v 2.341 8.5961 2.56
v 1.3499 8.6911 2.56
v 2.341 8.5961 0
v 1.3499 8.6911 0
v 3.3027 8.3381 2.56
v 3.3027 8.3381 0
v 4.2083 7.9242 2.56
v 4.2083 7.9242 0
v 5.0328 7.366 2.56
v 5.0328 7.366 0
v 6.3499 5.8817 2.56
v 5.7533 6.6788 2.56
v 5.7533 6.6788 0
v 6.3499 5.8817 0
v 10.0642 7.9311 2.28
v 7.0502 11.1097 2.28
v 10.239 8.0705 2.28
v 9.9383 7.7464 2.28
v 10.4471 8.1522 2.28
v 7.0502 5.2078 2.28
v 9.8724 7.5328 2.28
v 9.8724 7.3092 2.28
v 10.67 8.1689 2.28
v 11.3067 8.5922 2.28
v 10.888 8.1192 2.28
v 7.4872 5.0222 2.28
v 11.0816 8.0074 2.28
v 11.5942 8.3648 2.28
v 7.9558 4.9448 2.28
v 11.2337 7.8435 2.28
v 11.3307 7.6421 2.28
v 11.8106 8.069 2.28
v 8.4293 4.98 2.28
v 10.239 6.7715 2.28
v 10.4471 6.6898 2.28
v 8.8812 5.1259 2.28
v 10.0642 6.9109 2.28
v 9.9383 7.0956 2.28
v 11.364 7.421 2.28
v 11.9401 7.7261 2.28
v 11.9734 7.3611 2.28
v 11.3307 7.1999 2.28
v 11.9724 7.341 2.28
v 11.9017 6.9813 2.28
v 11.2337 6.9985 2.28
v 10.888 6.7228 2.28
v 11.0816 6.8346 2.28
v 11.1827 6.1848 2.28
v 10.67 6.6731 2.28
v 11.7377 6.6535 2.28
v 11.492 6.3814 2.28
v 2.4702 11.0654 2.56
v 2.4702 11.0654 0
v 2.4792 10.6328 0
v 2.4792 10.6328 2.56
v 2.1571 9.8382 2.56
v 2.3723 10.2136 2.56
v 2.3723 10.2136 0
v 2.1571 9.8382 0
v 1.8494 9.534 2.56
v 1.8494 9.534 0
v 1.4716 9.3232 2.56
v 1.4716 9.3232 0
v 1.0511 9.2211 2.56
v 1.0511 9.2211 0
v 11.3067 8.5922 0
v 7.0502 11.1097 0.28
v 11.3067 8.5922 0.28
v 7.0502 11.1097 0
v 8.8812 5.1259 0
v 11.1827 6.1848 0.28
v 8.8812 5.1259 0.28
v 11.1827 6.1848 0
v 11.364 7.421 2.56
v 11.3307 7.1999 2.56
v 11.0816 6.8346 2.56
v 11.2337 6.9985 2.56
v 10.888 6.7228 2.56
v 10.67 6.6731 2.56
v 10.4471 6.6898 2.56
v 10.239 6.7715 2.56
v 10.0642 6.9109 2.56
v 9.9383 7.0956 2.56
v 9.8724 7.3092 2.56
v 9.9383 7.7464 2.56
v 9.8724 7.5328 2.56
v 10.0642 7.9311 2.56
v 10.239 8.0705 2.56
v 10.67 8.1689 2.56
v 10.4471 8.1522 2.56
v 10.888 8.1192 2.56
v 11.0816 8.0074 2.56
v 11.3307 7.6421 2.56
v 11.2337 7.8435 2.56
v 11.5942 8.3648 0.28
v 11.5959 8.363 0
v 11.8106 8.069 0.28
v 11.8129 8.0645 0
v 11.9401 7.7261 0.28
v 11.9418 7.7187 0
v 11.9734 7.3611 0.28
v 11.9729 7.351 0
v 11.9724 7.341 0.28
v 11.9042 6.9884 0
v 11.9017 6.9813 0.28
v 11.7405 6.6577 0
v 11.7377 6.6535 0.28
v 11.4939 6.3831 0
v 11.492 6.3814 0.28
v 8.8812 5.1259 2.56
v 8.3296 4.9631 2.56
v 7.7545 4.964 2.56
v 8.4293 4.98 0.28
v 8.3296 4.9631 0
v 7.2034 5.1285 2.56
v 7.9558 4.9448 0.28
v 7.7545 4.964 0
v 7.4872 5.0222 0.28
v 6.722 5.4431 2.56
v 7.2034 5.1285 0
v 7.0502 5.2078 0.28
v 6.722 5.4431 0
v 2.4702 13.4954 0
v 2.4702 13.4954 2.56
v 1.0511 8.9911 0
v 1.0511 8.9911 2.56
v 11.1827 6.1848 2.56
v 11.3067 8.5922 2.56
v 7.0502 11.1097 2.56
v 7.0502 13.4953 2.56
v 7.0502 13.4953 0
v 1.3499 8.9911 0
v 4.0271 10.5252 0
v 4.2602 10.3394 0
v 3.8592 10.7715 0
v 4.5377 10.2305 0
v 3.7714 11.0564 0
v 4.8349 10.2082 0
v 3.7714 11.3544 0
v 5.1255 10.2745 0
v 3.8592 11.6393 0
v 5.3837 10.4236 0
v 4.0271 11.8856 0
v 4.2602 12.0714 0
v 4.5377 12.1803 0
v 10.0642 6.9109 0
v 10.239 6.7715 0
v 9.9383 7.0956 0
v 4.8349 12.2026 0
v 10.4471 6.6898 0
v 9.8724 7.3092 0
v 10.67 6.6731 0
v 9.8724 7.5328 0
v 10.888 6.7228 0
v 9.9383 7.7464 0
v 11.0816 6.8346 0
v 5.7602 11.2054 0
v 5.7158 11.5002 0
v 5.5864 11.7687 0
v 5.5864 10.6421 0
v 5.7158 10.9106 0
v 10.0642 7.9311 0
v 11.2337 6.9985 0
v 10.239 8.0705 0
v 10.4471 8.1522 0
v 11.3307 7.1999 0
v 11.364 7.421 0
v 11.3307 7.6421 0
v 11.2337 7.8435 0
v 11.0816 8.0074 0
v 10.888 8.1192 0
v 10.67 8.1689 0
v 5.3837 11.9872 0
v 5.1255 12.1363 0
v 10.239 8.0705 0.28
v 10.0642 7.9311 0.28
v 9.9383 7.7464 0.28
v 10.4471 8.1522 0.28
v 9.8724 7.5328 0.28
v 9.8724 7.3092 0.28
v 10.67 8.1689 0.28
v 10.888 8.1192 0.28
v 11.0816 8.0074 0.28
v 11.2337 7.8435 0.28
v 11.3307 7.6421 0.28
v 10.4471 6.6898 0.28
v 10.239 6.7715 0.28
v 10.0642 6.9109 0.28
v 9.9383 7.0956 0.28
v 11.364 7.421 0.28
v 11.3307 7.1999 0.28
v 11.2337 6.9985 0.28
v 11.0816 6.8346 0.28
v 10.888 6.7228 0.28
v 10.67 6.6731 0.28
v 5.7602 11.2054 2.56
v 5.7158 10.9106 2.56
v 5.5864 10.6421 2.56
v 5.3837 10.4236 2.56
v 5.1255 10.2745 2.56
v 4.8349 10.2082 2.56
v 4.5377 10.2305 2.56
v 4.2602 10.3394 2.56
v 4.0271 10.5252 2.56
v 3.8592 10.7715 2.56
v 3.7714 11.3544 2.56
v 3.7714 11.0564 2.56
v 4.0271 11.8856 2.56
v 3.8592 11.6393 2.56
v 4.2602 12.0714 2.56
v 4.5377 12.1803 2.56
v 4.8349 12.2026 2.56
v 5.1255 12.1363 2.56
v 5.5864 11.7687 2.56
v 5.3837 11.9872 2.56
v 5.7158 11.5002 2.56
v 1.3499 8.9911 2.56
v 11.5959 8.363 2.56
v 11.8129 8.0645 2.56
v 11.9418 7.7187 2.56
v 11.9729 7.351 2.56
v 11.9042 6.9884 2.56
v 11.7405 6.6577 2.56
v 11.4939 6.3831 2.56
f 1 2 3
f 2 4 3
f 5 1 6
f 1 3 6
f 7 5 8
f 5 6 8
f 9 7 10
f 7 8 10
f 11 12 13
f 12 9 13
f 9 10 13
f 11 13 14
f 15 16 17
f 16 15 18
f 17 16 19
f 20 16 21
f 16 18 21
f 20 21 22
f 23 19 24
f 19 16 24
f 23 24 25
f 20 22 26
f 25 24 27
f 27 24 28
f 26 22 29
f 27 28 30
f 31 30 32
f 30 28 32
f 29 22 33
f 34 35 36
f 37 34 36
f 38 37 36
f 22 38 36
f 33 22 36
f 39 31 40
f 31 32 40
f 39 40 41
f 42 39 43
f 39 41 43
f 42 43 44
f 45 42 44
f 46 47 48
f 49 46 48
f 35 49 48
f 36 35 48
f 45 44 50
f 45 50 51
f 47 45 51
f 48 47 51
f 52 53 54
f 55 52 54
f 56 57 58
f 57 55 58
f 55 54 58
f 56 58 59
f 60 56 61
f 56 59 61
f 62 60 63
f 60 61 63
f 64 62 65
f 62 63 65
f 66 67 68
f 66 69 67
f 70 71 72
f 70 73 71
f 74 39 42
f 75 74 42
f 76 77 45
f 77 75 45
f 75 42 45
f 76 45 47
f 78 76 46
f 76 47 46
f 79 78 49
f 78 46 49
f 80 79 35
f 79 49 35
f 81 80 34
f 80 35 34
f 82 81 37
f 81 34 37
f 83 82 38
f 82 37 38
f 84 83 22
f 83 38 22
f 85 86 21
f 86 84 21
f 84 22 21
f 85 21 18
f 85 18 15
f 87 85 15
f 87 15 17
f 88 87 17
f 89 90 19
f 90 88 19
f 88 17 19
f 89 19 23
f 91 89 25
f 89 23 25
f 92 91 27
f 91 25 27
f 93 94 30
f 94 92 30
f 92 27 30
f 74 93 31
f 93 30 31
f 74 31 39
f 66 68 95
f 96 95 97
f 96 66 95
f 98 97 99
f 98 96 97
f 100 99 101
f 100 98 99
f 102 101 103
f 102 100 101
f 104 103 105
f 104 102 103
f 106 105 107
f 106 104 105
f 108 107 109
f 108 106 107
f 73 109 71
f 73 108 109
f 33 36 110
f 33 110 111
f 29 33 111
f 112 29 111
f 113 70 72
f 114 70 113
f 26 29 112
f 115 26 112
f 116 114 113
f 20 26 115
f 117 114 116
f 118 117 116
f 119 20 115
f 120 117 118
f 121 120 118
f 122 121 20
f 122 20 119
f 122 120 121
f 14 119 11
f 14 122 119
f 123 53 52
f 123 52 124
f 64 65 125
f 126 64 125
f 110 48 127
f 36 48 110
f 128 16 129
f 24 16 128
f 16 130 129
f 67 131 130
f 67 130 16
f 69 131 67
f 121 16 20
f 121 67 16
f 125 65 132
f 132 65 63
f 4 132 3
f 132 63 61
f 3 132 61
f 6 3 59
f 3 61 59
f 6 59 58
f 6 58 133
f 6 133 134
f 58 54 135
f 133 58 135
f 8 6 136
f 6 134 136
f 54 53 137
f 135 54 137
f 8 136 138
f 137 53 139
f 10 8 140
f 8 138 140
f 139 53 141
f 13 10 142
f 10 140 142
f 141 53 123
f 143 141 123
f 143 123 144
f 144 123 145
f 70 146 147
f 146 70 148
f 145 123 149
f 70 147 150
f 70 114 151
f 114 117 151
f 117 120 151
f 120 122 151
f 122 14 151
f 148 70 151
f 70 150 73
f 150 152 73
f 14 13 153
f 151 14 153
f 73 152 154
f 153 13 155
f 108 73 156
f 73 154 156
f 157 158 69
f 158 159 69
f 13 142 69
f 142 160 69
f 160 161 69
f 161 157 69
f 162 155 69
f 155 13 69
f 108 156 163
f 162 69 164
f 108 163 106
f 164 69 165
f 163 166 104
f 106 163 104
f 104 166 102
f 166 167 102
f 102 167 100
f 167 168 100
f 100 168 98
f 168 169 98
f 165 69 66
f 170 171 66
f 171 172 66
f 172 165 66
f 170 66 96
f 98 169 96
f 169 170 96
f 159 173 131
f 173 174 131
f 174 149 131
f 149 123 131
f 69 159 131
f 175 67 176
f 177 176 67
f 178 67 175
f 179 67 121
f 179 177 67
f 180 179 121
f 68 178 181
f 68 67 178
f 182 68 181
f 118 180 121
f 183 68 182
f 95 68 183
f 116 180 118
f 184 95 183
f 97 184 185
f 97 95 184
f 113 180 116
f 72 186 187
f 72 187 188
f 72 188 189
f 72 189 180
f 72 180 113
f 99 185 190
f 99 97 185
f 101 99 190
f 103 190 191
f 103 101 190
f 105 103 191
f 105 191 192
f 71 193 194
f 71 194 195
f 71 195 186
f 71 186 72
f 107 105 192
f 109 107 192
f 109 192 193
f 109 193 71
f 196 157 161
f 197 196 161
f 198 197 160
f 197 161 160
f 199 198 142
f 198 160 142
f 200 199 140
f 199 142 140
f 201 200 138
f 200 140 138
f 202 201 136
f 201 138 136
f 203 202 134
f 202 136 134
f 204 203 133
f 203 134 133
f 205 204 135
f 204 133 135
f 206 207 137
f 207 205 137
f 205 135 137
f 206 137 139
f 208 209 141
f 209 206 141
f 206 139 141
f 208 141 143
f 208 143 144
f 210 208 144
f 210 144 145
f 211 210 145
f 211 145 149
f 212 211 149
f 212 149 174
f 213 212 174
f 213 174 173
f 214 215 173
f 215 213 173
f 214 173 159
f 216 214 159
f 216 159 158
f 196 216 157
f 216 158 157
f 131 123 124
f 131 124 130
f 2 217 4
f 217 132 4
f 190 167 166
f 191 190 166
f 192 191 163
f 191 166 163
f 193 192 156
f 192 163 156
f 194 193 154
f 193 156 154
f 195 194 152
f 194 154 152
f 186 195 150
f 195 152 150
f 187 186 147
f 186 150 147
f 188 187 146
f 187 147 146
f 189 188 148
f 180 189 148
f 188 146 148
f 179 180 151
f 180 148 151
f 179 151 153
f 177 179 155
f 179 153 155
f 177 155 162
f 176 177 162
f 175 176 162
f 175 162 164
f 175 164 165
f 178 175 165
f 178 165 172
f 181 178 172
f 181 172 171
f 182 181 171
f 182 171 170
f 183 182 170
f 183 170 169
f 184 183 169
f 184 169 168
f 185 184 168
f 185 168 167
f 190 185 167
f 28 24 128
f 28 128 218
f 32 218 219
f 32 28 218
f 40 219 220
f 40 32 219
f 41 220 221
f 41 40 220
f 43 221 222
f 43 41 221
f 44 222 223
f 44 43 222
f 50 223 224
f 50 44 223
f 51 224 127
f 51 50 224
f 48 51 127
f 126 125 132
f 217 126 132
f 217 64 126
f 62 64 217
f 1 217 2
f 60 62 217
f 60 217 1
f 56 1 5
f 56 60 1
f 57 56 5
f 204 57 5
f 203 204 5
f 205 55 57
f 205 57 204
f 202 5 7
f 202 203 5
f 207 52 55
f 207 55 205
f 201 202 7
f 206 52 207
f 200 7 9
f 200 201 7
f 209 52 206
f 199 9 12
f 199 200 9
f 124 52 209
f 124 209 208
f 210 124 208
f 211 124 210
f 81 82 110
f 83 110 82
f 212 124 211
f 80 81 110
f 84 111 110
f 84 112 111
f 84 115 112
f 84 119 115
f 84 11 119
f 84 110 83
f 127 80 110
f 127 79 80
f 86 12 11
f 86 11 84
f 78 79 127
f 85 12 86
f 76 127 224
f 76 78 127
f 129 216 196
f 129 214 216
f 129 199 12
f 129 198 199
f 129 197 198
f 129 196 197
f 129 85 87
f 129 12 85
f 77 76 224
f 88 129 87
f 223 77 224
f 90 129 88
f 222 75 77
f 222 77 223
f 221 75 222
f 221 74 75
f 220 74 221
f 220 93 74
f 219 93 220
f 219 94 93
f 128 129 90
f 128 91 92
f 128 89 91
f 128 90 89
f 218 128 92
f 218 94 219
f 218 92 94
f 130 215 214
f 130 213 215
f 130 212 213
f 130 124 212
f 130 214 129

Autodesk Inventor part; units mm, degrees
ref_plane "YZ Plane" through (0, 0, 0) normal (1, 0, 0) x (0, 1, 0)
ref_plane "XZ Plane" through (0, 0, 0) normal (0, 1, 0) x (-1, 0, 0)
sketch "Sketch1" plane through (0, 0, 0) normal (0, 0, 1) x (1, 0, 0)
  line L0 (0, 0) -> (13.07, 0) construction
  line L1 (13.07, 0) -> (13.07, 20) construction
  line L2 (13.07, 20) -> (0, 20) construction
  line L3 (0, 20) -> (0, 0) construction
  line L4 (0.0102, 11.1339) -> (2.4902, 11.1339) construction
  line L5 (7.0502, 11.1097) -> (11.3067, 8.5922)
  arc A0 (11.1827, 6.1848) -> (11.3067, 8.5922) centre (10.614, 7.421) ccw
  line L6 (2.4702, 13.4954) -> (7.0502, 13.4953)
  line L7 (7.0502, 13.4953) -> (7.0502, 11.1097)
  line L8 (2.4702, 11.0654) -> (2.4702, 13.4954)
  circle A1 centre (4.7602, 11.2054) radius 1
  circle A2 centre (4.7602, 11.2054) radius 2.29 construction
  circle A3 centre (10.614, 7.421) radius 0.75
  line L9 (7.0502, 11.1097) -> (7.0502, 4.2834) construction
  line L10 (11.1827, 6.1848) -> (7.0502, 4.2834)
  arc A4 (1.0511, 9.2211) -> (2.4702, 11.0654) centre (0.8865, 10.8158) ccw
  line L11 (1.0511, 9.2211) -> (1.0511, 8.9911)
  line L12 (1.0511, 8.9911) -> (1.3499, 8.9911)
  line L13 (1.3499, 8.9911) -> (1.3499, 8.6911)
  arc A5 (7.0502, 4.2834) -> (1.3499, 8.6911) centre (1.2762, 2.706) ccw
  point P0 (0, 8.9921)
  point P1 (0, 7.8144)
  point P2 (0, 7.3623)
  dimension "d0" = 20
  dimension "d1" = 13.07
  dimension "d7" = 2
  dimension "d8" = 4.58
  dimension "d11" = 1.5
  dimension "d34" = 0.23
  dimension "d35" = 0.3
extrude "Extrusion2" add sketch "Sketch1" along normal blind 2.56
ref_plane "Work Plane3" through (11.9729, 7.351, 2.56) normal (0.9986772, -0.0514186, 0) x (0.0514186, 0.9986772, 0)
sketch "Sketch5" plane through (11.9729, 7.351, 2.56) normal (0.9986772, -0.0514186, 0) x (0.0514186, 0.9986772, 0)
  line L0 (3.5006, -2.56) -> (3.5006, 0) projected
  line L1 (3.5006, -1.28) -> (3.5006, -0.28)
  line L2 (3.5006, -0.28) -> (3.5006, -1.28)
  line L3 (3.5006, -1.28) -> (3.5006, -2.28)
  line L4 (3.5006, -0.28) -> (-3.2437, -0.28)
  line L5 (-3.2437, -0.28) -> (-3.2437, -2.28)
  line L6 (3.5006, -2.28) -> (-3.2437, -2.28)
  point P0 (-7.9569, -2.56)
  dimension "d29" = 1
  dimension "d30" = 1
extrude "Extrusion6" cut sketch "Sketch5" against normal up to surface surface through (7.0502, 11.1097, 0) normal (1, -0.000029, 0)
fillet "Fillet3" radius 2 1 edges at (7.0502, 4.2834, 1.28)
properties material "Liga de Nickel-Copper 400"
